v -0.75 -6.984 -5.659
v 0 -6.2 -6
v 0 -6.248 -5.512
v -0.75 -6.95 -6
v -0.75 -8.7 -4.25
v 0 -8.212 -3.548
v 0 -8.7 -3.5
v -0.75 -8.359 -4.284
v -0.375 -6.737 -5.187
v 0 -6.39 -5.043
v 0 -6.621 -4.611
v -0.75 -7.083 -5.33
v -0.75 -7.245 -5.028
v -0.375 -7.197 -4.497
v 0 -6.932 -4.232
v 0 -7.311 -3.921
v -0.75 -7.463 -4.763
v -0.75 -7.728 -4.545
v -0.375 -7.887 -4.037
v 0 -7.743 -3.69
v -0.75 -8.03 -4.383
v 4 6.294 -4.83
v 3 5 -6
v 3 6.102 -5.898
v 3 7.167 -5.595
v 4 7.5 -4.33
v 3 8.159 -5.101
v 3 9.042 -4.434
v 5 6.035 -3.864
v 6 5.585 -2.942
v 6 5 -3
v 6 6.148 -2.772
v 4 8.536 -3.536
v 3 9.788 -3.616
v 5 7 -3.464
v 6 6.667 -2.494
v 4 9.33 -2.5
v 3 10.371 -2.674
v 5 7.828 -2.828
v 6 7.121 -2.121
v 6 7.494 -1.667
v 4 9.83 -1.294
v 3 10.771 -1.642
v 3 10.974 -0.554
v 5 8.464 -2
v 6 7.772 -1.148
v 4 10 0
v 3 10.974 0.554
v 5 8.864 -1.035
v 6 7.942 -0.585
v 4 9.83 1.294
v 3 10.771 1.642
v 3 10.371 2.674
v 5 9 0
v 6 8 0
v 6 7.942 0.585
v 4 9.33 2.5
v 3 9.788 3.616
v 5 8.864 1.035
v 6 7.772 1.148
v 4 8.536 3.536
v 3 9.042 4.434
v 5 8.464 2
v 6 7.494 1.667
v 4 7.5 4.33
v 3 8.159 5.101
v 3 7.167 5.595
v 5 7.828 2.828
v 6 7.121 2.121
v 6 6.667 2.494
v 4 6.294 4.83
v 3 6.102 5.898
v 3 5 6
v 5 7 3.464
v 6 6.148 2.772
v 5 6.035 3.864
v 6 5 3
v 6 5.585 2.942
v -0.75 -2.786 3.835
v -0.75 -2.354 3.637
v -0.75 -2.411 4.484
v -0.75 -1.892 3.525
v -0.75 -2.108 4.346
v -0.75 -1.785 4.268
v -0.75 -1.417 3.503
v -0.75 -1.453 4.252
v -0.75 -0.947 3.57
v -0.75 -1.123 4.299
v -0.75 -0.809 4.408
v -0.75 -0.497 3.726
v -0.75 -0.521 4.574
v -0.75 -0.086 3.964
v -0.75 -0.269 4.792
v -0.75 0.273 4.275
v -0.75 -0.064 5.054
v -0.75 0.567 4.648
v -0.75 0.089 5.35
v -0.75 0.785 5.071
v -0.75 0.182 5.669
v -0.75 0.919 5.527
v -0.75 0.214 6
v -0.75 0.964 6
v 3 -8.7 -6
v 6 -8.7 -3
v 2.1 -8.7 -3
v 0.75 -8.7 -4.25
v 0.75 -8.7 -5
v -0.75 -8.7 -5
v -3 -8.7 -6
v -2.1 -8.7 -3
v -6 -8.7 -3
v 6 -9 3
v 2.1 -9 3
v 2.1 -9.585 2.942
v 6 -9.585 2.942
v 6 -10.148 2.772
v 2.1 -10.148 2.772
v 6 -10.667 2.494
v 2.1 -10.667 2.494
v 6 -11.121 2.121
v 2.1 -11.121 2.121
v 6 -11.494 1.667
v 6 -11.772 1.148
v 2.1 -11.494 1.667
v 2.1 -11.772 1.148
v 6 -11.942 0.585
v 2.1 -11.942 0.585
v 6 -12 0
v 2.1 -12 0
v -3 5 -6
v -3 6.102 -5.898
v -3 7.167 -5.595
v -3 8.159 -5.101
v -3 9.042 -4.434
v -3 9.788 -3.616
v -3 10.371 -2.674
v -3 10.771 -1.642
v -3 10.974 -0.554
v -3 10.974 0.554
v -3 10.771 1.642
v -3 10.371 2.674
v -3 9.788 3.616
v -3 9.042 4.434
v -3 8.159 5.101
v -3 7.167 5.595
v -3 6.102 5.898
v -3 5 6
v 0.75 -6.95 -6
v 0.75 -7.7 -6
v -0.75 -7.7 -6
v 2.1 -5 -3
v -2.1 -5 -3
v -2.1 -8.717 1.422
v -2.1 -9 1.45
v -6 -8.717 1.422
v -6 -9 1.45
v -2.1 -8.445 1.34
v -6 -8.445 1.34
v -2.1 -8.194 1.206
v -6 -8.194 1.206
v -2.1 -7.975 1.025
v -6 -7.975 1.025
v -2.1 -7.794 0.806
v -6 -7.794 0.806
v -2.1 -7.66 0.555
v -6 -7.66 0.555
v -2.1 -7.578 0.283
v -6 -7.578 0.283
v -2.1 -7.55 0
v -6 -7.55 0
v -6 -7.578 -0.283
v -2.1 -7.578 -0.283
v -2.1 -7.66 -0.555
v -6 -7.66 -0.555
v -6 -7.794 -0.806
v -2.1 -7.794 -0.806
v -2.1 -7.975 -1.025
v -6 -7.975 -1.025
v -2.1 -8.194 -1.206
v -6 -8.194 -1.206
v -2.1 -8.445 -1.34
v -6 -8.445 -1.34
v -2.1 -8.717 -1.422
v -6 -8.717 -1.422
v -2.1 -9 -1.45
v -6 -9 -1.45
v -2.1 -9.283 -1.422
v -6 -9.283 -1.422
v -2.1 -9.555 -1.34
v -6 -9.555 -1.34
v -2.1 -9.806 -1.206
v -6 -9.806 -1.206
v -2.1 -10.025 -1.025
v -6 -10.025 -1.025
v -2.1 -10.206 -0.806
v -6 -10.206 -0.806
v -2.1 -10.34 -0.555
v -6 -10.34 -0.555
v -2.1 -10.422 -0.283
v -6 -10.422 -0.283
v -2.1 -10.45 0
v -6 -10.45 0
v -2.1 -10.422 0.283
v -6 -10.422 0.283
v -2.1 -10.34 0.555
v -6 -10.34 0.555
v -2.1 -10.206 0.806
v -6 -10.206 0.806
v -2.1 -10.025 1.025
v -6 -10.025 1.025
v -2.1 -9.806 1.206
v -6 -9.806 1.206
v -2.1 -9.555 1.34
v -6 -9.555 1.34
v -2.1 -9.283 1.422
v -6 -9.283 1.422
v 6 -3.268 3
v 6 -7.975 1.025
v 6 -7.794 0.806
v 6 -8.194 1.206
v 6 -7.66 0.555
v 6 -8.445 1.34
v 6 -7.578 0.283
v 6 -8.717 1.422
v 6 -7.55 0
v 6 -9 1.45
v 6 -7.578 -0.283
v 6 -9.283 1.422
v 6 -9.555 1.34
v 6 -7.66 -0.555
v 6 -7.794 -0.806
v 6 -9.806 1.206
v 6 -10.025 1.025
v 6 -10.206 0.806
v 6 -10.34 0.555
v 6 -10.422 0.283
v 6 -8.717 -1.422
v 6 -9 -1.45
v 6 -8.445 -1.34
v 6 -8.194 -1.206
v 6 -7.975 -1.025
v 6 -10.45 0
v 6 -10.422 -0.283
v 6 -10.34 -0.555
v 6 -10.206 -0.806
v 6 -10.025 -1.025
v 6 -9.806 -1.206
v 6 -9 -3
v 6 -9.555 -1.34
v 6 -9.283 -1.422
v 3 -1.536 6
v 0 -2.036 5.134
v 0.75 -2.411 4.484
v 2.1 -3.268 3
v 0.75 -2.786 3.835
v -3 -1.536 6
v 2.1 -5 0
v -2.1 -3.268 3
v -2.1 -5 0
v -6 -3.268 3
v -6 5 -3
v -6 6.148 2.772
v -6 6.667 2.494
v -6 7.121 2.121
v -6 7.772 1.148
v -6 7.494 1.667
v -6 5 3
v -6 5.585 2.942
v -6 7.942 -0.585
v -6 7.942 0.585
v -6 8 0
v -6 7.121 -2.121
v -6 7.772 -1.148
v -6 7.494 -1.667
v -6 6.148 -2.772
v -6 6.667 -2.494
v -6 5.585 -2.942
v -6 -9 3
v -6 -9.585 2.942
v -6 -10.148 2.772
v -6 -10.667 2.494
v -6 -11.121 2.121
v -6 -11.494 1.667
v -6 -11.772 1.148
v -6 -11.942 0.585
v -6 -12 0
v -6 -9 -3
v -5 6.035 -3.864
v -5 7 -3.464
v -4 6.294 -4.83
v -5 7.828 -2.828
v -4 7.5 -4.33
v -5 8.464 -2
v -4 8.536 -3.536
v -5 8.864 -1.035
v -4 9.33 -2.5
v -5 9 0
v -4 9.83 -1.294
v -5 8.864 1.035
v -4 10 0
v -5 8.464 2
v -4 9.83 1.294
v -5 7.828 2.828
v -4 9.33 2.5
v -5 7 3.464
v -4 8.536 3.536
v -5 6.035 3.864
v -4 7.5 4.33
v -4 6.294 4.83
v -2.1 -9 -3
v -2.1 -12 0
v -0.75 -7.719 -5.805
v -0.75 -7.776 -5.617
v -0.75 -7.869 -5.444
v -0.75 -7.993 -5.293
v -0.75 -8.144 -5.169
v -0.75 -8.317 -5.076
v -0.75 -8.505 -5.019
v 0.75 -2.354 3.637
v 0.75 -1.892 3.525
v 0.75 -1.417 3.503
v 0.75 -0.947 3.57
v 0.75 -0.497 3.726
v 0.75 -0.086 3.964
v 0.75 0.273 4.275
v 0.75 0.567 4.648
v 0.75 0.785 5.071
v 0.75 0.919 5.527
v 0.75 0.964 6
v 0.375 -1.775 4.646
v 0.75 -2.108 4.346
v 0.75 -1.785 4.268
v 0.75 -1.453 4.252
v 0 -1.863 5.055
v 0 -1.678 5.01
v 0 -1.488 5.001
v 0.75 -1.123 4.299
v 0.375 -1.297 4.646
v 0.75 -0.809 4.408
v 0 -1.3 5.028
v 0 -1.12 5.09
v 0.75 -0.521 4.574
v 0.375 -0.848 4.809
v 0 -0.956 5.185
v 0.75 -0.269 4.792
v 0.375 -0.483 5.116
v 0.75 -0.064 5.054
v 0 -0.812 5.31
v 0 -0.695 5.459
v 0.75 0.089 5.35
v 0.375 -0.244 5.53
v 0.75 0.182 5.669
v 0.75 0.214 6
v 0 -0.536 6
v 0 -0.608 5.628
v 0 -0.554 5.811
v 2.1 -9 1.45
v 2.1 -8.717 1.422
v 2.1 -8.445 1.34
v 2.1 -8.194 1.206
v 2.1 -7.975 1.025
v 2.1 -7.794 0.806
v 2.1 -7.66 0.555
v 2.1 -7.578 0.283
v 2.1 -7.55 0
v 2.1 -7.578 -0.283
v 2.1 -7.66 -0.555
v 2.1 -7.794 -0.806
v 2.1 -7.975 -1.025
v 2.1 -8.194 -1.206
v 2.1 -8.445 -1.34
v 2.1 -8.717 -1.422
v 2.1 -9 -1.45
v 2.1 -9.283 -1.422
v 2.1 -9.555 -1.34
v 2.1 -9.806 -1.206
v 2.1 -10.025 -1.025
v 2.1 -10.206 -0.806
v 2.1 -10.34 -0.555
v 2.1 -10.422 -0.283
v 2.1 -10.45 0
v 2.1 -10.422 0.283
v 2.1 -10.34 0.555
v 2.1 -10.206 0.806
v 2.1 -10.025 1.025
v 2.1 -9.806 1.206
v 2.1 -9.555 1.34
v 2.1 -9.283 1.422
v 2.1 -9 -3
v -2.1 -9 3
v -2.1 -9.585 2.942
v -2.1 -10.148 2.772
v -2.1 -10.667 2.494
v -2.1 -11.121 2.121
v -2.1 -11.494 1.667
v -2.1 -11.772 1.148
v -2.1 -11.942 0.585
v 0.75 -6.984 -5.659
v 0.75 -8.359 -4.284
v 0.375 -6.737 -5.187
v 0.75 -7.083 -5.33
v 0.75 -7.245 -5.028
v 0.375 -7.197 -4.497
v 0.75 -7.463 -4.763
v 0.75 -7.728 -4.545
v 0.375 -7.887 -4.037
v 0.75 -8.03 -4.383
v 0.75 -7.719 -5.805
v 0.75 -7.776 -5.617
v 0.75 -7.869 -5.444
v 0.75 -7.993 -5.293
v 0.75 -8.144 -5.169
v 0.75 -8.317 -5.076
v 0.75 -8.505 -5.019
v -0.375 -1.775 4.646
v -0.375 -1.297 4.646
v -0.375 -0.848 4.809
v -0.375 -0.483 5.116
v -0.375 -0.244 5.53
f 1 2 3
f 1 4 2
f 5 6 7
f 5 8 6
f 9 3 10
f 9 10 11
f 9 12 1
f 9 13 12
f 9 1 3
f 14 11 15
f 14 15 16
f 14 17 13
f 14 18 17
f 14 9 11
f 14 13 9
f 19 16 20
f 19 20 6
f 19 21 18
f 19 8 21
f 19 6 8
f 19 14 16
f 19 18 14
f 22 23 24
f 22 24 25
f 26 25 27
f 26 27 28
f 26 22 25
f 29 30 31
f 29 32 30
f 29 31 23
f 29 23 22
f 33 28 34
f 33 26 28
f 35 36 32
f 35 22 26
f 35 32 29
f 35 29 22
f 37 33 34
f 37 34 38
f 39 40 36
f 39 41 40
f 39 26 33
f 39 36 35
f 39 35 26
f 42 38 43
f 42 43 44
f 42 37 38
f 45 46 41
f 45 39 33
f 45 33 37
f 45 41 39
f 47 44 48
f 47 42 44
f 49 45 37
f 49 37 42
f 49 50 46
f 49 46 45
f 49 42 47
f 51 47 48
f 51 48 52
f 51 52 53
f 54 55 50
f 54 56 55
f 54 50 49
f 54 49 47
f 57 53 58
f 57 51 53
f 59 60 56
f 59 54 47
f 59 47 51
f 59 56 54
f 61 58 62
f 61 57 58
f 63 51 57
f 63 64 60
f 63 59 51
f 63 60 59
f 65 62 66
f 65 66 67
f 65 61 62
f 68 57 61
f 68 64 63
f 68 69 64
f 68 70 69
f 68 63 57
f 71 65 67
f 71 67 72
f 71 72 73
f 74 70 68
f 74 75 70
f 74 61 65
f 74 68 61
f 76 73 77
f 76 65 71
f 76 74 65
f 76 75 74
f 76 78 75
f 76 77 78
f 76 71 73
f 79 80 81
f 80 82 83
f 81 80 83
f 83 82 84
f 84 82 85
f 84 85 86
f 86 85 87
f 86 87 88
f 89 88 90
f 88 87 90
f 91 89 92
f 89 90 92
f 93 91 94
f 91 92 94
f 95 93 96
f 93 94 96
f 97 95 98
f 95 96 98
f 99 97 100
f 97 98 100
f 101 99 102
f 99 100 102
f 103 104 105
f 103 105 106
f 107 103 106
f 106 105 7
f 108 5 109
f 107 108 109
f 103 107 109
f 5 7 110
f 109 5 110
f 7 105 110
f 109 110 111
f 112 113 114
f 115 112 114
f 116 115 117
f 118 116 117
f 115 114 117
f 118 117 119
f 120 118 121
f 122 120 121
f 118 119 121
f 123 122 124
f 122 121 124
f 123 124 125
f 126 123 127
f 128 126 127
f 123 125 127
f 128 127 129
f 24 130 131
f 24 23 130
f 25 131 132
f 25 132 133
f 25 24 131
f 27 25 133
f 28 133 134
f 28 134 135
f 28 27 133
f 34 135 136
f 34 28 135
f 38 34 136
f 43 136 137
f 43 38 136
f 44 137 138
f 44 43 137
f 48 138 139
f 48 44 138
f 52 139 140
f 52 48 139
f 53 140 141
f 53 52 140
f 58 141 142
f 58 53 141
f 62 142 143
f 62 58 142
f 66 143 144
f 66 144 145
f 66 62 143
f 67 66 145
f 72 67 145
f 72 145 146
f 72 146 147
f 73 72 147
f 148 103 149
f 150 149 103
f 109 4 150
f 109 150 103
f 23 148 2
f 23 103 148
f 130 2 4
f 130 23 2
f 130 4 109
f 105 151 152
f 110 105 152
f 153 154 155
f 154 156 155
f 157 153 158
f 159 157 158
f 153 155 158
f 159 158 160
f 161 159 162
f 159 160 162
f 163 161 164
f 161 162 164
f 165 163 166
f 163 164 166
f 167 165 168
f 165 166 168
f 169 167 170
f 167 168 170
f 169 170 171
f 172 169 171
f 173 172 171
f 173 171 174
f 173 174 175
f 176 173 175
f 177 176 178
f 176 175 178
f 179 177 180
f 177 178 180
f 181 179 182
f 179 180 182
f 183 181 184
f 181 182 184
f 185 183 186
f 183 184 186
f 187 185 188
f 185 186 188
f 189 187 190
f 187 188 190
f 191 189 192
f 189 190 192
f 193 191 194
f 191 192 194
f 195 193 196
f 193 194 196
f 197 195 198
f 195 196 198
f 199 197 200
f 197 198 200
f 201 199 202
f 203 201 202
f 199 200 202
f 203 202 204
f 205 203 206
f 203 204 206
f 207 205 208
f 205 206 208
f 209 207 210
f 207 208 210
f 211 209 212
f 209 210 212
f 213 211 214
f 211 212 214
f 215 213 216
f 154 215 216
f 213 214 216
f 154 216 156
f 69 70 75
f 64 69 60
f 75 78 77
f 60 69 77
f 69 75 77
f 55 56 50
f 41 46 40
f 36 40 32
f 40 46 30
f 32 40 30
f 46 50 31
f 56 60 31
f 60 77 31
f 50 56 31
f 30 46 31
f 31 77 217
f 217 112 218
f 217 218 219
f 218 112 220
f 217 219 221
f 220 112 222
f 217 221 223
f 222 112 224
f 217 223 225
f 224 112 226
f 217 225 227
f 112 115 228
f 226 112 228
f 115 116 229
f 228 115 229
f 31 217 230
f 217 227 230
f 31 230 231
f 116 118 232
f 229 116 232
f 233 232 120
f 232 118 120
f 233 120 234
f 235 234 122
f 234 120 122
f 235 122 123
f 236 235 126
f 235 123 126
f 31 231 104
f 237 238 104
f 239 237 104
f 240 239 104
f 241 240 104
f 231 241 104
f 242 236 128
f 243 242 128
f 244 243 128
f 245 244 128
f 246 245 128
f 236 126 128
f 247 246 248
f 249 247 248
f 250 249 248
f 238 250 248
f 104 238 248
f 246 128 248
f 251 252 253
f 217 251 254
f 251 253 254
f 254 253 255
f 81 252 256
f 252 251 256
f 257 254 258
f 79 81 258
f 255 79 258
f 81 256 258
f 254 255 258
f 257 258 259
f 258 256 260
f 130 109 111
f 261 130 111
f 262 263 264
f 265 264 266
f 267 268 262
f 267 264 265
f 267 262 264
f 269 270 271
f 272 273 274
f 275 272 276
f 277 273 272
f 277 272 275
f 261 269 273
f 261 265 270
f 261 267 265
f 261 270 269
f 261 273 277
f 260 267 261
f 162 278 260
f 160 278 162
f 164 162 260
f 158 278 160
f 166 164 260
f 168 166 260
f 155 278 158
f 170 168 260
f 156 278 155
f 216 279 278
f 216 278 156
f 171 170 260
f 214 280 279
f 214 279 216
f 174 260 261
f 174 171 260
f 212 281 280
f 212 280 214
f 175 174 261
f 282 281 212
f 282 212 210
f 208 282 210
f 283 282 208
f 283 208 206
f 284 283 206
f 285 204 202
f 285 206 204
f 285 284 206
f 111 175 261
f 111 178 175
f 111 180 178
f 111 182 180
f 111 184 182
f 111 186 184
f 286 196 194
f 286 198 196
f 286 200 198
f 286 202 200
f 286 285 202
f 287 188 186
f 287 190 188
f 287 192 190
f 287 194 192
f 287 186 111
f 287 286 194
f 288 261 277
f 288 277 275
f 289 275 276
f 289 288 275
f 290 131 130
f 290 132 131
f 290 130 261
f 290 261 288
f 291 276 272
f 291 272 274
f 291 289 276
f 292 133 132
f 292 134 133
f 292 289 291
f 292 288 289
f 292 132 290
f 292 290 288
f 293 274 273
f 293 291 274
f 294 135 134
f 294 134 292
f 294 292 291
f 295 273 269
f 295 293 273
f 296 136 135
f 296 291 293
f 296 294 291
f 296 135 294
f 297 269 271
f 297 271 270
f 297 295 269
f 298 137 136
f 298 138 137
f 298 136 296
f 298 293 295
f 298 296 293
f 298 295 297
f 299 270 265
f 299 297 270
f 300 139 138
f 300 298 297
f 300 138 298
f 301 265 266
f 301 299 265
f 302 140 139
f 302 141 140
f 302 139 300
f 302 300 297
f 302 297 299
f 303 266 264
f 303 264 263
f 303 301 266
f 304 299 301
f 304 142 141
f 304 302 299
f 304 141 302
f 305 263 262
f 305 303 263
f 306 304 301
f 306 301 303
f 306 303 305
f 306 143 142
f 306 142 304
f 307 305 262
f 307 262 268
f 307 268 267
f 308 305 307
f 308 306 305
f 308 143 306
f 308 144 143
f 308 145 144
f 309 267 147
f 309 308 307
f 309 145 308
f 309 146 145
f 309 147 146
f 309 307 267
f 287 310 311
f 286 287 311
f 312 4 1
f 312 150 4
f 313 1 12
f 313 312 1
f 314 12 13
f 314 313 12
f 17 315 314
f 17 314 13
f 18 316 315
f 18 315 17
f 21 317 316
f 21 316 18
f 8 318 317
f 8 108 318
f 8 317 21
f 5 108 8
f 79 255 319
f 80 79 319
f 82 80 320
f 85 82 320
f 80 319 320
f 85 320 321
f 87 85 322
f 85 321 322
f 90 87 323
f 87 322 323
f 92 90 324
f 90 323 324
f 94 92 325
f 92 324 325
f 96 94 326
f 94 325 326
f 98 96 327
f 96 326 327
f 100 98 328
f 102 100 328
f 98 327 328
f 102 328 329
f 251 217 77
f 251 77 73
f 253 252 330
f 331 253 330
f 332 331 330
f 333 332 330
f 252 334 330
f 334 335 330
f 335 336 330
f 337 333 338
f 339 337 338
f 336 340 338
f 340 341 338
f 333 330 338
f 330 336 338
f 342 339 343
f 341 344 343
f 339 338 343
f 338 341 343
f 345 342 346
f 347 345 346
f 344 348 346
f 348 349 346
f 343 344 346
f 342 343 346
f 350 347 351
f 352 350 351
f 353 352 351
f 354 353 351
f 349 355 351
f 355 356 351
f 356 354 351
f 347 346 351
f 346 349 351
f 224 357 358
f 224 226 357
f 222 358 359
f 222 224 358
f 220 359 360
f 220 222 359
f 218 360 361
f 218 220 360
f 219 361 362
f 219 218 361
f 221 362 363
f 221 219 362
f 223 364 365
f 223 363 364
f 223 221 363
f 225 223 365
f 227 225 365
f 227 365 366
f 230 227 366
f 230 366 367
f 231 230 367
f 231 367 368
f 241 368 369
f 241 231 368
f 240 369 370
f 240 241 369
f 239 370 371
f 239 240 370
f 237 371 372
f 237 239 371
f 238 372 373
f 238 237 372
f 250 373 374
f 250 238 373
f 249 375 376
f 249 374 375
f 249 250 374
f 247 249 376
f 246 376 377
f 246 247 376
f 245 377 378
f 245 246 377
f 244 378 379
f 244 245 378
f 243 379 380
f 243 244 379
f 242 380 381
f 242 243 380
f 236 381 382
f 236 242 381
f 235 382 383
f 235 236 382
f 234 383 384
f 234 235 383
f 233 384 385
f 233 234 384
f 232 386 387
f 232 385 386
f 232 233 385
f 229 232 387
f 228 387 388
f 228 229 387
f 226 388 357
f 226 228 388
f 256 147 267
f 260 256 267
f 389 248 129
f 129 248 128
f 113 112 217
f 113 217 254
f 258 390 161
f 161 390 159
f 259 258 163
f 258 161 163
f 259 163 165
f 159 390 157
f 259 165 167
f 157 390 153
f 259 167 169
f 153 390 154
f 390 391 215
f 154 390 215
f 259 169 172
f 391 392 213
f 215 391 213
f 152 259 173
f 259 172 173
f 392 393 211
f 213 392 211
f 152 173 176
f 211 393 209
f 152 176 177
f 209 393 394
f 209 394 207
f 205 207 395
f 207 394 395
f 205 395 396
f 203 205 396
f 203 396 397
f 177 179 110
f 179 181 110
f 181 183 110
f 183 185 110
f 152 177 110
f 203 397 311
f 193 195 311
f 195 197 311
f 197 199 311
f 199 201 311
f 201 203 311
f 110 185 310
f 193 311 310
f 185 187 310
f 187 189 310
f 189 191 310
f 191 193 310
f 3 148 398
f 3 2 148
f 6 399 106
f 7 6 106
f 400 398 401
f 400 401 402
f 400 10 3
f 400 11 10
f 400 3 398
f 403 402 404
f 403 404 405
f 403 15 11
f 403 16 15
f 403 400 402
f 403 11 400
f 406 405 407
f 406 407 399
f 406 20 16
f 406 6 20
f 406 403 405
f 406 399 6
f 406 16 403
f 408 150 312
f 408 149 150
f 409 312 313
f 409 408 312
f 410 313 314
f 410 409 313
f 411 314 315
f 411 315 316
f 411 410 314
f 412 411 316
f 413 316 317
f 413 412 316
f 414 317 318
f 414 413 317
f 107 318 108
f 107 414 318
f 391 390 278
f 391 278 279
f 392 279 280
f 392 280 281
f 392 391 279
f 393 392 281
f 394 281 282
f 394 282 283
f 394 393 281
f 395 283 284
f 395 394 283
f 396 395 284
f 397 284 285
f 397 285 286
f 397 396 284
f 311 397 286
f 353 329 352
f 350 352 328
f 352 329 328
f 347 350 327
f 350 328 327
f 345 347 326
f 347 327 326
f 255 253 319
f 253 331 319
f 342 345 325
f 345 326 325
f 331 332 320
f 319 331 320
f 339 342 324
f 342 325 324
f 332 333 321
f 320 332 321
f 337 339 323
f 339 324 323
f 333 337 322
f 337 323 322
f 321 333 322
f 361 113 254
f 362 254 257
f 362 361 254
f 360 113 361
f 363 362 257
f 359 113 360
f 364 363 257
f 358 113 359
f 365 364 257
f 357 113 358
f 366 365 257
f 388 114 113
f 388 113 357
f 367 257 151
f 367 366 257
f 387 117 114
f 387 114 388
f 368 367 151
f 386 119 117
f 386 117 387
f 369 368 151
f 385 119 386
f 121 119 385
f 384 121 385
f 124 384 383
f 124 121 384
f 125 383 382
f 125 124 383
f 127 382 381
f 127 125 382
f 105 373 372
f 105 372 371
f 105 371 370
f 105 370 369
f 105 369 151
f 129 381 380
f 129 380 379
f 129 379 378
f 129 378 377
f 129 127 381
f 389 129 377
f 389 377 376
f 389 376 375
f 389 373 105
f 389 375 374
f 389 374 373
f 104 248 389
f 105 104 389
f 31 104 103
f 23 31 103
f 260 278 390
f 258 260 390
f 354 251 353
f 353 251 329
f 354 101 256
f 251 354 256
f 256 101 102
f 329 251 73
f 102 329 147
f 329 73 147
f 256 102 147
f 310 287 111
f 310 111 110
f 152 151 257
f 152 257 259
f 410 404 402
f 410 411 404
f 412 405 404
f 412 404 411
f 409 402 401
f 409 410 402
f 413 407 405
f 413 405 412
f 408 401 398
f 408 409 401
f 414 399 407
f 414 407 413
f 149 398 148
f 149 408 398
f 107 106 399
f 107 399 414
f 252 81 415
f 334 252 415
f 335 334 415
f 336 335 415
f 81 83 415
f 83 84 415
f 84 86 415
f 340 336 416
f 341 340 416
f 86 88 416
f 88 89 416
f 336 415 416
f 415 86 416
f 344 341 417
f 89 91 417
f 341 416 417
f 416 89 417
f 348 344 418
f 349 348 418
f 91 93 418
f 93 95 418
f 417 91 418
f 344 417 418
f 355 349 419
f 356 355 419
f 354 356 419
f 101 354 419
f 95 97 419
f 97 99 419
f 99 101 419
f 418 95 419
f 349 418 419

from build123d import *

# Parameters (mm, degrees)
BOSS_EXTRUDE1_DEPTH      = 5
CUT_EXTRUDE8_DEPTH       = 10.848857802
CUT_EXTRUDE8_DEPTH_BACK  = 10.848857802
REVOLVE1_ANGLE           = 180
SKETCH24_W               = 3.9
SKETCH24_H               = 6
BOSS_EXTRUDE2_DEPTH      = 4
SKETCH25_W               = 3.9
SKETCH25_H               = 3
REVOLVE2_ANGLE           = 180
SKETCH26_R               = 1.45
CUT_EXTRUDE9_DEPTH       = 19
BOSS_EXTRUDE4_DEPTH      = 3.7
CUT_EXTRUDE10_DEPTH      = 19
CUT_EXTRUDE10_DEPTH_BACK = 19


with BuildPart() as part:
    # Sketch2 → Boss-Extrude1 (new, symmetric)
    with BuildSketch(Plane(origin=(0, 0, 0), x_dir=(1, 0, 0), z_dir=(0, 1, 0))):
        Polygon((-3, 6), (3, 6), (6, 3), (6, -3), (3, -6), (-3, -6), (-6, -3), (-6, 3), align=None)
    extrude(amount=BOSS_EXTRUDE1_DEPTH, both=True)

    # Sketch22 → Cut-Extrude8 (cut, two sides: drawn at the far end of the back side and taken through both)
    with BuildSketch(Plane(origin=(0, 0, 0), x_dir=(0, 0, -1), z_dir=(1, 0, 0)).offset(-CUT_EXTRUDE8_DEPTH_BACK)):
        Polygon((0, -5), (-6, -5), (-6, -1.535898385), align=None)
    extrude(amount=CUT_EXTRUDE8_DEPTH + CUT_EXTRUDE8_DEPTH_BACK, mode=Mode.SUBTRACT)

    # Sketch23 → Revolve1 (revolve)
    with BuildSketch(Plane(origin=(0, 5, 0), x_dir=(1, 0, 0), z_dir=(0, 1, 0))):
        Polygon((-6, 0), (-6, 3), (-3, 6), (3, 6), (6, 3), (6, 0), align=None)
    revolve(axis=Axis((6, 5, 0), (1, 0, 0)), revolution_arc=REVOLVE1_ANGLE)

    # Sketch24 → Boss-Extrude2 (add, symmetric)
    with BuildSketch(Plane.XZ.offset(5)):
        with Locations((-4.05, 0)):
            Rectangle(SKETCH24_W, SKETCH24_H)
    boss_extrude2 = extrude(amount=BOSS_EXTRUDE2_DEPTH, both=True)

    # Sketch25 → Revolve2 (revolve)
    with BuildSketch(Plane.XZ.offset(9)):
        with Locations((-4.05, 1.5)):
            Rectangle(SKETCH25_W, SKETCH25_H)
    revolve2 = revolve(axis=Axis((-6, -9, 0), (1, 0, 0)), revolution_arc=REVOLVE2_ANGLE)

    # Sketch26 → Cut-Extrude9 (cut, symmetric)
    with BuildSketch(Plane.ZY.offset(6)):
        with Locations((0, -9)):
            Circle(SKETCH26_R)
    cut_extrude9 = extrude(amount=CUT_EXTRUDE9_DEPTH, both=True, mode=Mode.SUBTRACT)

    # Mirror1: Boss-Extrude2, Revolve2, Cut-Extrude9 across plane
    add(boss_extrude2.mirror(Plane(origin=(0, 0, 0), x_dir=(0, 0, 1), z_dir=(1, 0, 0))))
    add(revolve2.mirror(Plane(origin=(0, 0, 0), x_dir=(0, 0, 1), z_dir=(1, 0, 0))))
    add(cut_extrude9.mirror(Plane(origin=(0, 0, 0), x_dir=(0, 0, 1), z_dir=(1, 0, 0))), mode=Mode.SUBTRACT)

    # Sketch30 → Cut-Revolve1 (revolve, cut)
    with BuildSketch(Plane(origin=(0, -3.75, 2.165063509), x_dir=(1, 0, 0), z_dir=(0, -0.8660254037844418, 0.49999999999999484))):
        Polygon((0, 3.42820323), (-0.75, 2.67820323), (-0.75, 1.92820323), (0.75, 1.92820323), (0.75, 2.67820323), align=None)
    revolve(axis=Axis((-6, -1.535898385, 6), (1, 0, 0)), mode=Mode.SUBTRACT)

    # Sketch34 → Boss-Extrude4 (add)
    with BuildSketch(Plane.XZ.offset(5)):
        Polygon((-6, -3), (-2.1, -3), (2.1, -3), (6, -3), (3, -6), (-3, -6), align=None)
    extrude(amount=BOSS_EXTRUDE4_DEPTH)

    # Sketch35 → Cut-Revolve3 (revolve, cut)
    with BuildSketch(Plane.XZ.offset(8.7)):
        Polygon((0, -3.5), (-0.75, -4.25), (-0.75, -5), (0.75, -5), (0.75, -4.25), align=None)
    revolve(axis=Axis((3, -8.7, -6), (1, 0, 0)), mode=Mode.SUBTRACT)

    # Sketch36 → Cut-Extrude10 (cut, two sides: drawn at the far end of the back side and taken through both)
    with BuildSketch(Plane.ZY.offset(6).offset(-CUT_EXTRUDE10_DEPTH_BACK)):
        Polygon((-3, -9), (0, -12), (0, -13.528535059), (-3.643435522, -13.528535059), (-3.643435522, -9), align=None)
    extrude(amount=CUT_EXTRUDE10_DEPTH + CUT_EXTRUDE10_DEPTH_BACK, mode=Mode.SUBTRACT)


solid = part.part
